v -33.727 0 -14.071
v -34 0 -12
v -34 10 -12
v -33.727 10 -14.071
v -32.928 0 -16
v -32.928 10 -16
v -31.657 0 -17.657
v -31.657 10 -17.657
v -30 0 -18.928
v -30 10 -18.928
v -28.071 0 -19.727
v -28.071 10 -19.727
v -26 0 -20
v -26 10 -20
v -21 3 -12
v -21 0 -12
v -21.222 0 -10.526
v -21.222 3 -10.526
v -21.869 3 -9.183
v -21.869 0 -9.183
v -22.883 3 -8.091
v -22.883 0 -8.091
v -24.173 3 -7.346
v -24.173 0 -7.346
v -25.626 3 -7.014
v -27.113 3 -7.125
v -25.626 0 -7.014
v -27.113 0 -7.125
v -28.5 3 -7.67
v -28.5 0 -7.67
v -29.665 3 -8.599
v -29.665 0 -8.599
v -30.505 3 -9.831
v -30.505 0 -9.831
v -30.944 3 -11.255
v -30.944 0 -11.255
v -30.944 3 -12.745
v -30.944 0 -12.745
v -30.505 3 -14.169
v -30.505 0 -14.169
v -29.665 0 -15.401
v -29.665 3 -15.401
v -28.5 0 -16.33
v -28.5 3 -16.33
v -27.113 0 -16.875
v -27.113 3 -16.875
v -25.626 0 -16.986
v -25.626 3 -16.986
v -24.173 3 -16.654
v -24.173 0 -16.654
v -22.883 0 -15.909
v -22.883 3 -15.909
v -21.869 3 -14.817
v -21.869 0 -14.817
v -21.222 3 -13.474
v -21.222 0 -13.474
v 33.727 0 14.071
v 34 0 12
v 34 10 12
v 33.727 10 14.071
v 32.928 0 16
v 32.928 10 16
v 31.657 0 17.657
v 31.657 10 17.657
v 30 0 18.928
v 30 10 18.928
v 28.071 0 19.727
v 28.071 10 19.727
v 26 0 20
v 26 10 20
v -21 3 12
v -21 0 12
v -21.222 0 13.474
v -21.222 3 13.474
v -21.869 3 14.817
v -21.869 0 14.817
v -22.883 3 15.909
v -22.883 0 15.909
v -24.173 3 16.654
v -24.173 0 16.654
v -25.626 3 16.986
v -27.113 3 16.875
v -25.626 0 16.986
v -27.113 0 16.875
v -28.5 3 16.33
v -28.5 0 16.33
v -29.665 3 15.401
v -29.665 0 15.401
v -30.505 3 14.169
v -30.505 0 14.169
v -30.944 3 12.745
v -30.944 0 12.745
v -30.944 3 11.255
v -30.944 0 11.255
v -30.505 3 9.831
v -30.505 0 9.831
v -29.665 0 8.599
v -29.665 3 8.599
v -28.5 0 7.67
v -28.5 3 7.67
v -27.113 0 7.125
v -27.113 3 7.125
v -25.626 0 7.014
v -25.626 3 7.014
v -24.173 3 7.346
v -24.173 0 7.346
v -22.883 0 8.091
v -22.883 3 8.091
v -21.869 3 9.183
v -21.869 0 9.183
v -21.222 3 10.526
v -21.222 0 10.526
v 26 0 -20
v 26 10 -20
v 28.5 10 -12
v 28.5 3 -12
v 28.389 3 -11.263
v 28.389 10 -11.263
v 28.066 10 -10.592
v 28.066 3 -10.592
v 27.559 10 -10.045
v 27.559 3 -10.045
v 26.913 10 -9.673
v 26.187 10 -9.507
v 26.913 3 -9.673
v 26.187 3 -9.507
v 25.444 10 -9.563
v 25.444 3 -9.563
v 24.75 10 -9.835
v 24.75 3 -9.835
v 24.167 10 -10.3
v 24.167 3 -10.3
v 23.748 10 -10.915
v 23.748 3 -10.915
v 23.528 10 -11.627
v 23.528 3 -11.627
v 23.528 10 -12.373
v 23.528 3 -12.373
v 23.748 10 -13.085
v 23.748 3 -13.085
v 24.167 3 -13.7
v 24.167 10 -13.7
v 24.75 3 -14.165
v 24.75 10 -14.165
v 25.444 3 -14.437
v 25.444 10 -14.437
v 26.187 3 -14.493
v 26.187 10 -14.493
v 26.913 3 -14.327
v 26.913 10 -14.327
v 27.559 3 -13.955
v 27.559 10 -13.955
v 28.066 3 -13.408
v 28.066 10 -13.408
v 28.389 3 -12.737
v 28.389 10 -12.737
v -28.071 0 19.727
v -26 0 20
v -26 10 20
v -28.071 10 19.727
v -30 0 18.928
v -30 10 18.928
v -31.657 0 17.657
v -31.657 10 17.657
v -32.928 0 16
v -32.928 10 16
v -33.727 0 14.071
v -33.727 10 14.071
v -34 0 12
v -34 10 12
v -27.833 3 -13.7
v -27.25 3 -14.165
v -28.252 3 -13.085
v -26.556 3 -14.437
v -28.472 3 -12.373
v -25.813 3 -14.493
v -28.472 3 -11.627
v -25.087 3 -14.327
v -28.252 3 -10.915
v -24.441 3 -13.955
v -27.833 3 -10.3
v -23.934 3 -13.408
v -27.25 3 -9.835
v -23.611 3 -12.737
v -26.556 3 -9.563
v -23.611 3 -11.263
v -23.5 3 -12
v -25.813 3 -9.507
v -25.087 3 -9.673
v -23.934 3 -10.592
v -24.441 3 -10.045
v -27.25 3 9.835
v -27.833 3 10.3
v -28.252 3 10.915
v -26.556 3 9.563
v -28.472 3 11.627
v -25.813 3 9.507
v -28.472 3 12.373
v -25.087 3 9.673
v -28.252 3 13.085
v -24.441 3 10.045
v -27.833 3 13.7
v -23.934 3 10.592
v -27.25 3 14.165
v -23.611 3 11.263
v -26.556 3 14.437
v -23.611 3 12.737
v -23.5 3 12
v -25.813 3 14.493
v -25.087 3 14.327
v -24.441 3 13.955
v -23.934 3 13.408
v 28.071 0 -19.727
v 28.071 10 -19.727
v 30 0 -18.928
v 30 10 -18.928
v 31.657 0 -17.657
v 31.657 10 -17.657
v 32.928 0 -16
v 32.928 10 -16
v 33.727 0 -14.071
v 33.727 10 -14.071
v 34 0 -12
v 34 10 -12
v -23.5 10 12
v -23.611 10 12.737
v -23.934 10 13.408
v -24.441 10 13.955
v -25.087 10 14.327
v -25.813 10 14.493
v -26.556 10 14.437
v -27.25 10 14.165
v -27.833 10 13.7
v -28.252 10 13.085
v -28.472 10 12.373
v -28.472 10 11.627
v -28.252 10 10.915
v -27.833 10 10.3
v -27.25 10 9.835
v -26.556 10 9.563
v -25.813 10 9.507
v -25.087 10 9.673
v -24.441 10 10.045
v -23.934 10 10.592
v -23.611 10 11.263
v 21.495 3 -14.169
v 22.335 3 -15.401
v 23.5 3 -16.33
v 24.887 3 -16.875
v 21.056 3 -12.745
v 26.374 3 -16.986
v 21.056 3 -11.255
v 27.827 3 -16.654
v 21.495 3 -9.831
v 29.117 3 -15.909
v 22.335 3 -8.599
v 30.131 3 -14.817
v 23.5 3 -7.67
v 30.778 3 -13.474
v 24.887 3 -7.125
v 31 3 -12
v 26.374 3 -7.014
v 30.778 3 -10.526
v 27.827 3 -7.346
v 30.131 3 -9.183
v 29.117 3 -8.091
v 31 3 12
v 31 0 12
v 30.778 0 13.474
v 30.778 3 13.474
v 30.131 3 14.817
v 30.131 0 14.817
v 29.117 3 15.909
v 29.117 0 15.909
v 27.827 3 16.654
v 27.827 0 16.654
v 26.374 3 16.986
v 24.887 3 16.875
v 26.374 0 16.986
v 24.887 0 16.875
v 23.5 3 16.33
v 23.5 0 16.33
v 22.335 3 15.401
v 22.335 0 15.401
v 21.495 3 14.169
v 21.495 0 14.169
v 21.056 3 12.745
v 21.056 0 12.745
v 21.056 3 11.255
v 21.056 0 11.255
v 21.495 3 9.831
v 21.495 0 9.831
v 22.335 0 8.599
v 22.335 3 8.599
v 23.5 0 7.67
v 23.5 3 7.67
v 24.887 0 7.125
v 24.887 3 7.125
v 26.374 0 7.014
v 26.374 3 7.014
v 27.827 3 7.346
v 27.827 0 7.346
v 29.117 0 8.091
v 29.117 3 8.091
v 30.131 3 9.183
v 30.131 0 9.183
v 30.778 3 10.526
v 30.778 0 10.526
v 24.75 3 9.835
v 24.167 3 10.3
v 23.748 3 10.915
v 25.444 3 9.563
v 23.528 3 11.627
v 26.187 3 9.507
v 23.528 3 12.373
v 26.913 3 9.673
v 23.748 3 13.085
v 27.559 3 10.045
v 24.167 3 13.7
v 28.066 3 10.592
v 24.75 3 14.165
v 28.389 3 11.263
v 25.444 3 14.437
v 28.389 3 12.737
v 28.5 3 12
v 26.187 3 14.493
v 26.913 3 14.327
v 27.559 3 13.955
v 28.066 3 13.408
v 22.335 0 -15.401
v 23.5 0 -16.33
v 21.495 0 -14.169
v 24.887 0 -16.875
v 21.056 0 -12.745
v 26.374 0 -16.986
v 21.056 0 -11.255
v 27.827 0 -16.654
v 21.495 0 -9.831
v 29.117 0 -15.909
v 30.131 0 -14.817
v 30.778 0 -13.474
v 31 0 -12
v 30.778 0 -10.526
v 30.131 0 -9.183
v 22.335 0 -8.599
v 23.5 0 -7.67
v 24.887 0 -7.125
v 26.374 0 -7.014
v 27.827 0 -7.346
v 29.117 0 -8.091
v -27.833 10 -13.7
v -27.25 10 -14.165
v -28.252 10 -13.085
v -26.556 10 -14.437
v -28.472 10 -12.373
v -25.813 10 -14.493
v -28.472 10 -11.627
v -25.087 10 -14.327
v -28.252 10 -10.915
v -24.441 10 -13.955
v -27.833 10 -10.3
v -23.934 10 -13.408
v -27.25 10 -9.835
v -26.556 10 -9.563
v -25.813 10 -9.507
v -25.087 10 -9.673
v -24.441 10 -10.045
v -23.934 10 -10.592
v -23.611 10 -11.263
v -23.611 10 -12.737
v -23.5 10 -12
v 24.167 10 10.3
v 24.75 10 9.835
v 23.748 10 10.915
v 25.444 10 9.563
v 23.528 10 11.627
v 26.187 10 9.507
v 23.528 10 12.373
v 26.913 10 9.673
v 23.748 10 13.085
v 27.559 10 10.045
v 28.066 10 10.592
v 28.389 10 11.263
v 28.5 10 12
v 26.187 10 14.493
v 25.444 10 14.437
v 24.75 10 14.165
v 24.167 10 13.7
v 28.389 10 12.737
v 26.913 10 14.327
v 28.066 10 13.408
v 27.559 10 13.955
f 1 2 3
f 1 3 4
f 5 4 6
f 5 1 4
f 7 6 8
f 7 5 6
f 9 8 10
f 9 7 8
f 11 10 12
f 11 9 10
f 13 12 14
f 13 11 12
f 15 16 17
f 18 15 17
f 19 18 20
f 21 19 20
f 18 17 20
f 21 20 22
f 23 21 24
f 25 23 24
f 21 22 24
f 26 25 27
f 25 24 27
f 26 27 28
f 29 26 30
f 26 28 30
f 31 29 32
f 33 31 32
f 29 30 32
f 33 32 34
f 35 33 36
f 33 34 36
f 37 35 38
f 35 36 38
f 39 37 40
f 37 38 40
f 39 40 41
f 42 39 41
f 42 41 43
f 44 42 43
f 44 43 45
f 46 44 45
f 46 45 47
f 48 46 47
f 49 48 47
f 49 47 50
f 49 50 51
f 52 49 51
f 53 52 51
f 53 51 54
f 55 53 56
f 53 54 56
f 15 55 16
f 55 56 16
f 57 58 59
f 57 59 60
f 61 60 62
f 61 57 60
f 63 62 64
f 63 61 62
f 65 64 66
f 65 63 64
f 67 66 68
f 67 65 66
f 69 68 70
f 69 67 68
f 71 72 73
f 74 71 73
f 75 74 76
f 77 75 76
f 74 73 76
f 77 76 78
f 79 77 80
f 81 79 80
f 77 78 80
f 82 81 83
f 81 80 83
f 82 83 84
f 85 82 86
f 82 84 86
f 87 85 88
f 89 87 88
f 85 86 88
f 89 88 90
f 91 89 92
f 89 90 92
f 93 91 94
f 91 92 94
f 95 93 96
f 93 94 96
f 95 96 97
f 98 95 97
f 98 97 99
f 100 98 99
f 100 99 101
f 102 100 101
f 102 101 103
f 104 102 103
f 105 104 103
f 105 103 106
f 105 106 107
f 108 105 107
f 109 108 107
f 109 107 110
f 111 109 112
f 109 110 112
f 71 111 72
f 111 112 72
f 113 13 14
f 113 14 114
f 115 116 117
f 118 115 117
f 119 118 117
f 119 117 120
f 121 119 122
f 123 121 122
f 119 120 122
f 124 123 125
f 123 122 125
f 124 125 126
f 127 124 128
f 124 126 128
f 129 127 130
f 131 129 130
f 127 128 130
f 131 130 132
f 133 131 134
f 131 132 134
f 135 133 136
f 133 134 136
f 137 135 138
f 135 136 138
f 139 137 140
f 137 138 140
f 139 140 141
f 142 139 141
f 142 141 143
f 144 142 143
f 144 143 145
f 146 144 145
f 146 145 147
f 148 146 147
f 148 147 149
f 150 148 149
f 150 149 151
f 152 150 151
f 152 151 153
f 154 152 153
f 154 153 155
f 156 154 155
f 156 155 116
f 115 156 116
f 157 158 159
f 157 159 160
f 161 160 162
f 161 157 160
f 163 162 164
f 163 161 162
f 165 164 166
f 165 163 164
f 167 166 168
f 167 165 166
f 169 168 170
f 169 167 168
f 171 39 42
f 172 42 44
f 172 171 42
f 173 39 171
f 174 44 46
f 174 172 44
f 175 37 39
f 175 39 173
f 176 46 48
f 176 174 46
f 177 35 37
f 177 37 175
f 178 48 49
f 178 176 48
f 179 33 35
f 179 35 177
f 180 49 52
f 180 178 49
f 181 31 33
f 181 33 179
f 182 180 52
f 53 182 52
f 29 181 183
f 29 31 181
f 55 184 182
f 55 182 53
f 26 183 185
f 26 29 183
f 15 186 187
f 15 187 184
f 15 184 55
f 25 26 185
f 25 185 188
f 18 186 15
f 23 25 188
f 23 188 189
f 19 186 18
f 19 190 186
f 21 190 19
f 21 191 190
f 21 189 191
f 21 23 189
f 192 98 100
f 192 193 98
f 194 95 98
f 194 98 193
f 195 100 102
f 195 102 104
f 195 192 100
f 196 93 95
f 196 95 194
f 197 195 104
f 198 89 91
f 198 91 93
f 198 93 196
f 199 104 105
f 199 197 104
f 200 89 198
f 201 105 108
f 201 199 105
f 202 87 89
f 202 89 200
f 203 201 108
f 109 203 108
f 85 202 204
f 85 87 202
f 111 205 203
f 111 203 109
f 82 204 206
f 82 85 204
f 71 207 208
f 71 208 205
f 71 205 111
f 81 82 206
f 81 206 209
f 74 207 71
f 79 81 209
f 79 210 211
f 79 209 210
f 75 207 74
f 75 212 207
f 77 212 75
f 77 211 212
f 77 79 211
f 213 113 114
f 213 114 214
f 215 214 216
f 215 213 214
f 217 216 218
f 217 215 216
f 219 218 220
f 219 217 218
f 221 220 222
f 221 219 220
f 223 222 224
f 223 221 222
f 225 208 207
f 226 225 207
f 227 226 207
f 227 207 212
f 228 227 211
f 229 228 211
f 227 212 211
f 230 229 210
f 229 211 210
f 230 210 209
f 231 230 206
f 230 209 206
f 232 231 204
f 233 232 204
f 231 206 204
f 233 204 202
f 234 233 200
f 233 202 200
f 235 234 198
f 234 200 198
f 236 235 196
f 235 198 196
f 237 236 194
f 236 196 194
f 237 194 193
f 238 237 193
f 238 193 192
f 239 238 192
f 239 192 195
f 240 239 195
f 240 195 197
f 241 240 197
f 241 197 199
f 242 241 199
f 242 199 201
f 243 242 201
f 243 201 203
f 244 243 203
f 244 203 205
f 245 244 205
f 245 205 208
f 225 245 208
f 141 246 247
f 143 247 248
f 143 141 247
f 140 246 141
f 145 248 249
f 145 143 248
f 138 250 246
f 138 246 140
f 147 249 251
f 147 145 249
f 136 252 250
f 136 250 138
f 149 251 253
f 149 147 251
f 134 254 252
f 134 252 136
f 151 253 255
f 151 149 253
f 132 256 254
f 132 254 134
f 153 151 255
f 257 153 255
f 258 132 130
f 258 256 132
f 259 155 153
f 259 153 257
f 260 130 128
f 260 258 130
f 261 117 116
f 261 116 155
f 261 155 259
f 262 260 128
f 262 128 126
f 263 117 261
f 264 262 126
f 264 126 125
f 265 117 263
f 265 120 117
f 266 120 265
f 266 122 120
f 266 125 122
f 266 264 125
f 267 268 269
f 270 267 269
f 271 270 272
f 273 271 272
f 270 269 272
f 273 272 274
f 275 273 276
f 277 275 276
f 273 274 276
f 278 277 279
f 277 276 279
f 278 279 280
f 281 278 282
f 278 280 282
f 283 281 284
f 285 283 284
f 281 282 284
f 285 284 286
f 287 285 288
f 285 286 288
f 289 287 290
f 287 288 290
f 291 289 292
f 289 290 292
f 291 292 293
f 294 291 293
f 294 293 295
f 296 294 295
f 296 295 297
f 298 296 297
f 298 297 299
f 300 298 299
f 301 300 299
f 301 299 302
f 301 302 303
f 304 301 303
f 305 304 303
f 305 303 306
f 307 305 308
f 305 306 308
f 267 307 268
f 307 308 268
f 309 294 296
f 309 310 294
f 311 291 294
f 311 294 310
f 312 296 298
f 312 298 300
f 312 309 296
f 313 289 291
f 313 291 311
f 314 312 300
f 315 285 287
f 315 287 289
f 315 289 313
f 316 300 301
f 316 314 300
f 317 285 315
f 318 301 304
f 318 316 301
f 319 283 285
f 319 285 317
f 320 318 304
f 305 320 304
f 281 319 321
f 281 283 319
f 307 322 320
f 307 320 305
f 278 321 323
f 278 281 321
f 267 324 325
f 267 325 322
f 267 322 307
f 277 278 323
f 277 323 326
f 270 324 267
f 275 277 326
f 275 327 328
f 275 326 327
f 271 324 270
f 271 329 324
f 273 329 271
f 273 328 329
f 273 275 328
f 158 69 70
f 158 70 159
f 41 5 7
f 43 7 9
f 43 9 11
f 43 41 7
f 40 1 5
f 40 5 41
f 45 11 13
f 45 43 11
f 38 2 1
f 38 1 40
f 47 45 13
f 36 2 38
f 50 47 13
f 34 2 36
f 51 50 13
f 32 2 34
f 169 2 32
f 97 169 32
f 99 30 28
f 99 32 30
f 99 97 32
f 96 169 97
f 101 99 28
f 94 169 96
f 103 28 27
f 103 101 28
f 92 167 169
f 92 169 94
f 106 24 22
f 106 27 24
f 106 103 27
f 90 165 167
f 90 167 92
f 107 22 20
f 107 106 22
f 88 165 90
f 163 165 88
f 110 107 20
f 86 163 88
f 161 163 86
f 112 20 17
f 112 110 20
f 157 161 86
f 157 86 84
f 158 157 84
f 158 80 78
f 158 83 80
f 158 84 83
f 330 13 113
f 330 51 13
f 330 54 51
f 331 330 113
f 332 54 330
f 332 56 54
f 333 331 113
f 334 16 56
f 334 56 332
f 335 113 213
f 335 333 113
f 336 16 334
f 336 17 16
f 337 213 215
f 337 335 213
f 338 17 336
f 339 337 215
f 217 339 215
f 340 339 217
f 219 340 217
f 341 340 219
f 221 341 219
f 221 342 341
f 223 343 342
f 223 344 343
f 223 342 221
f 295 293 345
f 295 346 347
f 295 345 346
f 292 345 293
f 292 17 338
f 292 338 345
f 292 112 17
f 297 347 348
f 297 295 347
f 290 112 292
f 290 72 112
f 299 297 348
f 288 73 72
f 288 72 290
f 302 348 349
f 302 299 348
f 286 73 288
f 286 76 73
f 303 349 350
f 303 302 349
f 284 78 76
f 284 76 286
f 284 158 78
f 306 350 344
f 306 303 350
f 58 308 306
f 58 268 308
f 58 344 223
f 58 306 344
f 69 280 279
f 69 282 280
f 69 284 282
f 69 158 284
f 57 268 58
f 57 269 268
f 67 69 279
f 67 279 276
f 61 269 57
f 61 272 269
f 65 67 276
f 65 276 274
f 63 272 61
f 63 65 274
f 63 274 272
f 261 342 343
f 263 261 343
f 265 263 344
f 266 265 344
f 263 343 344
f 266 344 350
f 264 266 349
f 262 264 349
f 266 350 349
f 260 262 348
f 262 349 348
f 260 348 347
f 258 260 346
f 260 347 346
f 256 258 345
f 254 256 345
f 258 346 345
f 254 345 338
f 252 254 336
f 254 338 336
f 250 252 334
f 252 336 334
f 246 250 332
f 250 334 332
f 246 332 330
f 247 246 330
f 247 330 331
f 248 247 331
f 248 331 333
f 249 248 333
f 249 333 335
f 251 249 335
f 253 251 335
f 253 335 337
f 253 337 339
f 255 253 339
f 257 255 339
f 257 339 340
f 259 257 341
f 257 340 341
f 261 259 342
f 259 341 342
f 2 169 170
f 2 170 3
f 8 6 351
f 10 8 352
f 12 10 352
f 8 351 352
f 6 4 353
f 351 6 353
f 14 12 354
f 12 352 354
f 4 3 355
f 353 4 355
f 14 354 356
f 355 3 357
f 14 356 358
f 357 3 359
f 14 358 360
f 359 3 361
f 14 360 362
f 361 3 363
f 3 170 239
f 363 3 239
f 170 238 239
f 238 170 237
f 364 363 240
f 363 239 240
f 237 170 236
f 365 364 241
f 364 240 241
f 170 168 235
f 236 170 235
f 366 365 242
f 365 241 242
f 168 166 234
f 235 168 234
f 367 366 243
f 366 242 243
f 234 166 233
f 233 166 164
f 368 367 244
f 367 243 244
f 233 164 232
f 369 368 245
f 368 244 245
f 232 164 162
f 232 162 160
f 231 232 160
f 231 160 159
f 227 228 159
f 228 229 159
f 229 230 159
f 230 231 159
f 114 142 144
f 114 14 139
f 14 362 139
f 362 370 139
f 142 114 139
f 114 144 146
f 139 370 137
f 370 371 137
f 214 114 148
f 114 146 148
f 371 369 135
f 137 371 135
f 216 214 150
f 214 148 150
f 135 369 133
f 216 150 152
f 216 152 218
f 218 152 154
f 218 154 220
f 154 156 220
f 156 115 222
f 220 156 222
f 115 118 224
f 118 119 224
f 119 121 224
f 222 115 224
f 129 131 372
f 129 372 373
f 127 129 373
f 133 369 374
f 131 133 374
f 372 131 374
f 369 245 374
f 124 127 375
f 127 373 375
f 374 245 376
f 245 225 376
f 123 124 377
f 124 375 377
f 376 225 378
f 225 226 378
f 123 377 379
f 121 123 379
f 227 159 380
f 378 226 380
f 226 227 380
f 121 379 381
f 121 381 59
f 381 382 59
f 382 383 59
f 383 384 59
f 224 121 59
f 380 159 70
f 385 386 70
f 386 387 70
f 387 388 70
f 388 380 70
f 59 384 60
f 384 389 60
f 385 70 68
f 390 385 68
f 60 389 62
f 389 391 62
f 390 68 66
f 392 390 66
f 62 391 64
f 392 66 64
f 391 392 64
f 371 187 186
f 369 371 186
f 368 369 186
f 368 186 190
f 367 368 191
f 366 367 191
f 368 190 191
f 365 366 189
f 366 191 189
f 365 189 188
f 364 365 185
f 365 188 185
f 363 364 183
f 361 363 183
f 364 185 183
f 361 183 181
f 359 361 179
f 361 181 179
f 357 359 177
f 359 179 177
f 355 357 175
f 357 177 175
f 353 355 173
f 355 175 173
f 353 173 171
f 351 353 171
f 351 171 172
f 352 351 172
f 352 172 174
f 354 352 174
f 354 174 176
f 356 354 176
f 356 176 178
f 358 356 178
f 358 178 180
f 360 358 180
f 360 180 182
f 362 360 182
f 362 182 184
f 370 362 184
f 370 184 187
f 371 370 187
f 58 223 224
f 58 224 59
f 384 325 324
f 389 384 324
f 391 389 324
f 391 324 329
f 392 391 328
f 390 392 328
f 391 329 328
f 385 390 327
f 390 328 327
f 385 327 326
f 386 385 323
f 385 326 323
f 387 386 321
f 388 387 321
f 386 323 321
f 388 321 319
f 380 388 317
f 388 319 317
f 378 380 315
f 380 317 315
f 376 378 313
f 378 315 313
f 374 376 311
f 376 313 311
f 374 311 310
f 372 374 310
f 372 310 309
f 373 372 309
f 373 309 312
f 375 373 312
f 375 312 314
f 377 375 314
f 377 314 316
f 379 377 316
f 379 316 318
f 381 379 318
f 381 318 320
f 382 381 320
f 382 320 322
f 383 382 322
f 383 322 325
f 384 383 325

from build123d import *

# Parameters (mm, degrees)
F0_R     = 5
F0_R_2   = 2.5
F0_W     = 28
F0_H     = 8
F1_DEPTH = 10
F2_DEPTH = 3


with BuildPart() as f1:
    # F0 (on Front) → F1 (new body)
    with BuildSketch(Plane.XZ):
        with BuildLine():
            Line((-14, 20), (-26, 20))
            ThreePointArc((-26, 20), (-31.656854, 17.656854), (-34, 12))
            Line((-34, 12), (-34, -12))
            ThreePointArc((-34, -12), (-31.656854, -17.656854), (-26, -20))
            Line((-26, -20), (-14, -20))
            Line((-14, -20), (-14, -12))
            Line((-14, -12), (14, -12))
            Line((14, -12), (14, -20))
            Line((14, -20), (26, -20))
            ThreePointArc((26, -20), (31.656854, -17.656854), (34, -12))
            Line((34, -12), (34, 12))
            ThreePointArc((34, 12), (31.656854, 17.656854), (26, 20))
            Line((26, 20), (14, 20))
            Line((14, 20), (14, 12))
            Line((14, 12), (-14, 12))
            Line((-14, 12), (-14, 20))
        make_face()
        with Locations((-26, -12)):
            Circle(F0_R, mode=Mode.SUBTRACT)
        with Locations((26, -12)):
            Circle(F0_R, mode=Mode.SUBTRACT)
        with Locations((-26, 12)):
            Circle(F0_R, mode=Mode.SUBTRACT)
        with Locations((26, 12)):
            Circle(F0_R, mode=Mode.SUBTRACT)
        with Locations((-26, 12)):
            Circle(F0_R)
        with Locations((-26, 12)):
            Circle(F0_R_2, mode=Mode.SUBTRACT)
        with Locations((26, 12)):
            Circle(F0_R)
        with Locations((26, 12)):
            Circle(F0_R_2, mode=Mode.SUBTRACT)
        with Locations((26, -12)):
            Circle(F0_R)
        with Locations((26, -12)):
            Circle(F0_R_2, mode=Mode.SUBTRACT)
        with Locations((-26, -12)):
            Circle(F0_R)
        with Locations((-26, -12)):
            Circle(F0_R_2, mode=Mode.SUBTRACT)
        with Locations((0, -16)):
            Rectangle(F0_W, F0_H)
        with Locations((0, 16)):
            Rectangle(F0_W, F0_H)
    extrude(amount=-F1_DEPTH)

    # F0 (on Front) → F2 (cut)
    with BuildSketch(Plane.XZ):
        with Locations((-26, 12)):
            Circle(F0_R)
        with Locations((-26, 12)):
            Circle(F0_R_2, mode=Mode.SUBTRACT)
        with Locations((26, 12)):
            Circle(F0_R)
        with Locations((26, 12)):
            Circle(F0_R_2, mode=Mode.SUBTRACT)
        with Locations((26, -12)):
            Circle(F0_R)
        with Locations((26, -12)):
            Circle(F0_R_2, mode=Mode.SUBTRACT)
        with Locations((-26, -12)):
            Circle(F0_R)
        with Locations((-26, -12)):
            Circle(F0_R_2, mode=Mode.SUBTRACT)
    extrude(amount=-F2_DEPTH, mode=Mode.SUBTRACT)


solid = f1.part
